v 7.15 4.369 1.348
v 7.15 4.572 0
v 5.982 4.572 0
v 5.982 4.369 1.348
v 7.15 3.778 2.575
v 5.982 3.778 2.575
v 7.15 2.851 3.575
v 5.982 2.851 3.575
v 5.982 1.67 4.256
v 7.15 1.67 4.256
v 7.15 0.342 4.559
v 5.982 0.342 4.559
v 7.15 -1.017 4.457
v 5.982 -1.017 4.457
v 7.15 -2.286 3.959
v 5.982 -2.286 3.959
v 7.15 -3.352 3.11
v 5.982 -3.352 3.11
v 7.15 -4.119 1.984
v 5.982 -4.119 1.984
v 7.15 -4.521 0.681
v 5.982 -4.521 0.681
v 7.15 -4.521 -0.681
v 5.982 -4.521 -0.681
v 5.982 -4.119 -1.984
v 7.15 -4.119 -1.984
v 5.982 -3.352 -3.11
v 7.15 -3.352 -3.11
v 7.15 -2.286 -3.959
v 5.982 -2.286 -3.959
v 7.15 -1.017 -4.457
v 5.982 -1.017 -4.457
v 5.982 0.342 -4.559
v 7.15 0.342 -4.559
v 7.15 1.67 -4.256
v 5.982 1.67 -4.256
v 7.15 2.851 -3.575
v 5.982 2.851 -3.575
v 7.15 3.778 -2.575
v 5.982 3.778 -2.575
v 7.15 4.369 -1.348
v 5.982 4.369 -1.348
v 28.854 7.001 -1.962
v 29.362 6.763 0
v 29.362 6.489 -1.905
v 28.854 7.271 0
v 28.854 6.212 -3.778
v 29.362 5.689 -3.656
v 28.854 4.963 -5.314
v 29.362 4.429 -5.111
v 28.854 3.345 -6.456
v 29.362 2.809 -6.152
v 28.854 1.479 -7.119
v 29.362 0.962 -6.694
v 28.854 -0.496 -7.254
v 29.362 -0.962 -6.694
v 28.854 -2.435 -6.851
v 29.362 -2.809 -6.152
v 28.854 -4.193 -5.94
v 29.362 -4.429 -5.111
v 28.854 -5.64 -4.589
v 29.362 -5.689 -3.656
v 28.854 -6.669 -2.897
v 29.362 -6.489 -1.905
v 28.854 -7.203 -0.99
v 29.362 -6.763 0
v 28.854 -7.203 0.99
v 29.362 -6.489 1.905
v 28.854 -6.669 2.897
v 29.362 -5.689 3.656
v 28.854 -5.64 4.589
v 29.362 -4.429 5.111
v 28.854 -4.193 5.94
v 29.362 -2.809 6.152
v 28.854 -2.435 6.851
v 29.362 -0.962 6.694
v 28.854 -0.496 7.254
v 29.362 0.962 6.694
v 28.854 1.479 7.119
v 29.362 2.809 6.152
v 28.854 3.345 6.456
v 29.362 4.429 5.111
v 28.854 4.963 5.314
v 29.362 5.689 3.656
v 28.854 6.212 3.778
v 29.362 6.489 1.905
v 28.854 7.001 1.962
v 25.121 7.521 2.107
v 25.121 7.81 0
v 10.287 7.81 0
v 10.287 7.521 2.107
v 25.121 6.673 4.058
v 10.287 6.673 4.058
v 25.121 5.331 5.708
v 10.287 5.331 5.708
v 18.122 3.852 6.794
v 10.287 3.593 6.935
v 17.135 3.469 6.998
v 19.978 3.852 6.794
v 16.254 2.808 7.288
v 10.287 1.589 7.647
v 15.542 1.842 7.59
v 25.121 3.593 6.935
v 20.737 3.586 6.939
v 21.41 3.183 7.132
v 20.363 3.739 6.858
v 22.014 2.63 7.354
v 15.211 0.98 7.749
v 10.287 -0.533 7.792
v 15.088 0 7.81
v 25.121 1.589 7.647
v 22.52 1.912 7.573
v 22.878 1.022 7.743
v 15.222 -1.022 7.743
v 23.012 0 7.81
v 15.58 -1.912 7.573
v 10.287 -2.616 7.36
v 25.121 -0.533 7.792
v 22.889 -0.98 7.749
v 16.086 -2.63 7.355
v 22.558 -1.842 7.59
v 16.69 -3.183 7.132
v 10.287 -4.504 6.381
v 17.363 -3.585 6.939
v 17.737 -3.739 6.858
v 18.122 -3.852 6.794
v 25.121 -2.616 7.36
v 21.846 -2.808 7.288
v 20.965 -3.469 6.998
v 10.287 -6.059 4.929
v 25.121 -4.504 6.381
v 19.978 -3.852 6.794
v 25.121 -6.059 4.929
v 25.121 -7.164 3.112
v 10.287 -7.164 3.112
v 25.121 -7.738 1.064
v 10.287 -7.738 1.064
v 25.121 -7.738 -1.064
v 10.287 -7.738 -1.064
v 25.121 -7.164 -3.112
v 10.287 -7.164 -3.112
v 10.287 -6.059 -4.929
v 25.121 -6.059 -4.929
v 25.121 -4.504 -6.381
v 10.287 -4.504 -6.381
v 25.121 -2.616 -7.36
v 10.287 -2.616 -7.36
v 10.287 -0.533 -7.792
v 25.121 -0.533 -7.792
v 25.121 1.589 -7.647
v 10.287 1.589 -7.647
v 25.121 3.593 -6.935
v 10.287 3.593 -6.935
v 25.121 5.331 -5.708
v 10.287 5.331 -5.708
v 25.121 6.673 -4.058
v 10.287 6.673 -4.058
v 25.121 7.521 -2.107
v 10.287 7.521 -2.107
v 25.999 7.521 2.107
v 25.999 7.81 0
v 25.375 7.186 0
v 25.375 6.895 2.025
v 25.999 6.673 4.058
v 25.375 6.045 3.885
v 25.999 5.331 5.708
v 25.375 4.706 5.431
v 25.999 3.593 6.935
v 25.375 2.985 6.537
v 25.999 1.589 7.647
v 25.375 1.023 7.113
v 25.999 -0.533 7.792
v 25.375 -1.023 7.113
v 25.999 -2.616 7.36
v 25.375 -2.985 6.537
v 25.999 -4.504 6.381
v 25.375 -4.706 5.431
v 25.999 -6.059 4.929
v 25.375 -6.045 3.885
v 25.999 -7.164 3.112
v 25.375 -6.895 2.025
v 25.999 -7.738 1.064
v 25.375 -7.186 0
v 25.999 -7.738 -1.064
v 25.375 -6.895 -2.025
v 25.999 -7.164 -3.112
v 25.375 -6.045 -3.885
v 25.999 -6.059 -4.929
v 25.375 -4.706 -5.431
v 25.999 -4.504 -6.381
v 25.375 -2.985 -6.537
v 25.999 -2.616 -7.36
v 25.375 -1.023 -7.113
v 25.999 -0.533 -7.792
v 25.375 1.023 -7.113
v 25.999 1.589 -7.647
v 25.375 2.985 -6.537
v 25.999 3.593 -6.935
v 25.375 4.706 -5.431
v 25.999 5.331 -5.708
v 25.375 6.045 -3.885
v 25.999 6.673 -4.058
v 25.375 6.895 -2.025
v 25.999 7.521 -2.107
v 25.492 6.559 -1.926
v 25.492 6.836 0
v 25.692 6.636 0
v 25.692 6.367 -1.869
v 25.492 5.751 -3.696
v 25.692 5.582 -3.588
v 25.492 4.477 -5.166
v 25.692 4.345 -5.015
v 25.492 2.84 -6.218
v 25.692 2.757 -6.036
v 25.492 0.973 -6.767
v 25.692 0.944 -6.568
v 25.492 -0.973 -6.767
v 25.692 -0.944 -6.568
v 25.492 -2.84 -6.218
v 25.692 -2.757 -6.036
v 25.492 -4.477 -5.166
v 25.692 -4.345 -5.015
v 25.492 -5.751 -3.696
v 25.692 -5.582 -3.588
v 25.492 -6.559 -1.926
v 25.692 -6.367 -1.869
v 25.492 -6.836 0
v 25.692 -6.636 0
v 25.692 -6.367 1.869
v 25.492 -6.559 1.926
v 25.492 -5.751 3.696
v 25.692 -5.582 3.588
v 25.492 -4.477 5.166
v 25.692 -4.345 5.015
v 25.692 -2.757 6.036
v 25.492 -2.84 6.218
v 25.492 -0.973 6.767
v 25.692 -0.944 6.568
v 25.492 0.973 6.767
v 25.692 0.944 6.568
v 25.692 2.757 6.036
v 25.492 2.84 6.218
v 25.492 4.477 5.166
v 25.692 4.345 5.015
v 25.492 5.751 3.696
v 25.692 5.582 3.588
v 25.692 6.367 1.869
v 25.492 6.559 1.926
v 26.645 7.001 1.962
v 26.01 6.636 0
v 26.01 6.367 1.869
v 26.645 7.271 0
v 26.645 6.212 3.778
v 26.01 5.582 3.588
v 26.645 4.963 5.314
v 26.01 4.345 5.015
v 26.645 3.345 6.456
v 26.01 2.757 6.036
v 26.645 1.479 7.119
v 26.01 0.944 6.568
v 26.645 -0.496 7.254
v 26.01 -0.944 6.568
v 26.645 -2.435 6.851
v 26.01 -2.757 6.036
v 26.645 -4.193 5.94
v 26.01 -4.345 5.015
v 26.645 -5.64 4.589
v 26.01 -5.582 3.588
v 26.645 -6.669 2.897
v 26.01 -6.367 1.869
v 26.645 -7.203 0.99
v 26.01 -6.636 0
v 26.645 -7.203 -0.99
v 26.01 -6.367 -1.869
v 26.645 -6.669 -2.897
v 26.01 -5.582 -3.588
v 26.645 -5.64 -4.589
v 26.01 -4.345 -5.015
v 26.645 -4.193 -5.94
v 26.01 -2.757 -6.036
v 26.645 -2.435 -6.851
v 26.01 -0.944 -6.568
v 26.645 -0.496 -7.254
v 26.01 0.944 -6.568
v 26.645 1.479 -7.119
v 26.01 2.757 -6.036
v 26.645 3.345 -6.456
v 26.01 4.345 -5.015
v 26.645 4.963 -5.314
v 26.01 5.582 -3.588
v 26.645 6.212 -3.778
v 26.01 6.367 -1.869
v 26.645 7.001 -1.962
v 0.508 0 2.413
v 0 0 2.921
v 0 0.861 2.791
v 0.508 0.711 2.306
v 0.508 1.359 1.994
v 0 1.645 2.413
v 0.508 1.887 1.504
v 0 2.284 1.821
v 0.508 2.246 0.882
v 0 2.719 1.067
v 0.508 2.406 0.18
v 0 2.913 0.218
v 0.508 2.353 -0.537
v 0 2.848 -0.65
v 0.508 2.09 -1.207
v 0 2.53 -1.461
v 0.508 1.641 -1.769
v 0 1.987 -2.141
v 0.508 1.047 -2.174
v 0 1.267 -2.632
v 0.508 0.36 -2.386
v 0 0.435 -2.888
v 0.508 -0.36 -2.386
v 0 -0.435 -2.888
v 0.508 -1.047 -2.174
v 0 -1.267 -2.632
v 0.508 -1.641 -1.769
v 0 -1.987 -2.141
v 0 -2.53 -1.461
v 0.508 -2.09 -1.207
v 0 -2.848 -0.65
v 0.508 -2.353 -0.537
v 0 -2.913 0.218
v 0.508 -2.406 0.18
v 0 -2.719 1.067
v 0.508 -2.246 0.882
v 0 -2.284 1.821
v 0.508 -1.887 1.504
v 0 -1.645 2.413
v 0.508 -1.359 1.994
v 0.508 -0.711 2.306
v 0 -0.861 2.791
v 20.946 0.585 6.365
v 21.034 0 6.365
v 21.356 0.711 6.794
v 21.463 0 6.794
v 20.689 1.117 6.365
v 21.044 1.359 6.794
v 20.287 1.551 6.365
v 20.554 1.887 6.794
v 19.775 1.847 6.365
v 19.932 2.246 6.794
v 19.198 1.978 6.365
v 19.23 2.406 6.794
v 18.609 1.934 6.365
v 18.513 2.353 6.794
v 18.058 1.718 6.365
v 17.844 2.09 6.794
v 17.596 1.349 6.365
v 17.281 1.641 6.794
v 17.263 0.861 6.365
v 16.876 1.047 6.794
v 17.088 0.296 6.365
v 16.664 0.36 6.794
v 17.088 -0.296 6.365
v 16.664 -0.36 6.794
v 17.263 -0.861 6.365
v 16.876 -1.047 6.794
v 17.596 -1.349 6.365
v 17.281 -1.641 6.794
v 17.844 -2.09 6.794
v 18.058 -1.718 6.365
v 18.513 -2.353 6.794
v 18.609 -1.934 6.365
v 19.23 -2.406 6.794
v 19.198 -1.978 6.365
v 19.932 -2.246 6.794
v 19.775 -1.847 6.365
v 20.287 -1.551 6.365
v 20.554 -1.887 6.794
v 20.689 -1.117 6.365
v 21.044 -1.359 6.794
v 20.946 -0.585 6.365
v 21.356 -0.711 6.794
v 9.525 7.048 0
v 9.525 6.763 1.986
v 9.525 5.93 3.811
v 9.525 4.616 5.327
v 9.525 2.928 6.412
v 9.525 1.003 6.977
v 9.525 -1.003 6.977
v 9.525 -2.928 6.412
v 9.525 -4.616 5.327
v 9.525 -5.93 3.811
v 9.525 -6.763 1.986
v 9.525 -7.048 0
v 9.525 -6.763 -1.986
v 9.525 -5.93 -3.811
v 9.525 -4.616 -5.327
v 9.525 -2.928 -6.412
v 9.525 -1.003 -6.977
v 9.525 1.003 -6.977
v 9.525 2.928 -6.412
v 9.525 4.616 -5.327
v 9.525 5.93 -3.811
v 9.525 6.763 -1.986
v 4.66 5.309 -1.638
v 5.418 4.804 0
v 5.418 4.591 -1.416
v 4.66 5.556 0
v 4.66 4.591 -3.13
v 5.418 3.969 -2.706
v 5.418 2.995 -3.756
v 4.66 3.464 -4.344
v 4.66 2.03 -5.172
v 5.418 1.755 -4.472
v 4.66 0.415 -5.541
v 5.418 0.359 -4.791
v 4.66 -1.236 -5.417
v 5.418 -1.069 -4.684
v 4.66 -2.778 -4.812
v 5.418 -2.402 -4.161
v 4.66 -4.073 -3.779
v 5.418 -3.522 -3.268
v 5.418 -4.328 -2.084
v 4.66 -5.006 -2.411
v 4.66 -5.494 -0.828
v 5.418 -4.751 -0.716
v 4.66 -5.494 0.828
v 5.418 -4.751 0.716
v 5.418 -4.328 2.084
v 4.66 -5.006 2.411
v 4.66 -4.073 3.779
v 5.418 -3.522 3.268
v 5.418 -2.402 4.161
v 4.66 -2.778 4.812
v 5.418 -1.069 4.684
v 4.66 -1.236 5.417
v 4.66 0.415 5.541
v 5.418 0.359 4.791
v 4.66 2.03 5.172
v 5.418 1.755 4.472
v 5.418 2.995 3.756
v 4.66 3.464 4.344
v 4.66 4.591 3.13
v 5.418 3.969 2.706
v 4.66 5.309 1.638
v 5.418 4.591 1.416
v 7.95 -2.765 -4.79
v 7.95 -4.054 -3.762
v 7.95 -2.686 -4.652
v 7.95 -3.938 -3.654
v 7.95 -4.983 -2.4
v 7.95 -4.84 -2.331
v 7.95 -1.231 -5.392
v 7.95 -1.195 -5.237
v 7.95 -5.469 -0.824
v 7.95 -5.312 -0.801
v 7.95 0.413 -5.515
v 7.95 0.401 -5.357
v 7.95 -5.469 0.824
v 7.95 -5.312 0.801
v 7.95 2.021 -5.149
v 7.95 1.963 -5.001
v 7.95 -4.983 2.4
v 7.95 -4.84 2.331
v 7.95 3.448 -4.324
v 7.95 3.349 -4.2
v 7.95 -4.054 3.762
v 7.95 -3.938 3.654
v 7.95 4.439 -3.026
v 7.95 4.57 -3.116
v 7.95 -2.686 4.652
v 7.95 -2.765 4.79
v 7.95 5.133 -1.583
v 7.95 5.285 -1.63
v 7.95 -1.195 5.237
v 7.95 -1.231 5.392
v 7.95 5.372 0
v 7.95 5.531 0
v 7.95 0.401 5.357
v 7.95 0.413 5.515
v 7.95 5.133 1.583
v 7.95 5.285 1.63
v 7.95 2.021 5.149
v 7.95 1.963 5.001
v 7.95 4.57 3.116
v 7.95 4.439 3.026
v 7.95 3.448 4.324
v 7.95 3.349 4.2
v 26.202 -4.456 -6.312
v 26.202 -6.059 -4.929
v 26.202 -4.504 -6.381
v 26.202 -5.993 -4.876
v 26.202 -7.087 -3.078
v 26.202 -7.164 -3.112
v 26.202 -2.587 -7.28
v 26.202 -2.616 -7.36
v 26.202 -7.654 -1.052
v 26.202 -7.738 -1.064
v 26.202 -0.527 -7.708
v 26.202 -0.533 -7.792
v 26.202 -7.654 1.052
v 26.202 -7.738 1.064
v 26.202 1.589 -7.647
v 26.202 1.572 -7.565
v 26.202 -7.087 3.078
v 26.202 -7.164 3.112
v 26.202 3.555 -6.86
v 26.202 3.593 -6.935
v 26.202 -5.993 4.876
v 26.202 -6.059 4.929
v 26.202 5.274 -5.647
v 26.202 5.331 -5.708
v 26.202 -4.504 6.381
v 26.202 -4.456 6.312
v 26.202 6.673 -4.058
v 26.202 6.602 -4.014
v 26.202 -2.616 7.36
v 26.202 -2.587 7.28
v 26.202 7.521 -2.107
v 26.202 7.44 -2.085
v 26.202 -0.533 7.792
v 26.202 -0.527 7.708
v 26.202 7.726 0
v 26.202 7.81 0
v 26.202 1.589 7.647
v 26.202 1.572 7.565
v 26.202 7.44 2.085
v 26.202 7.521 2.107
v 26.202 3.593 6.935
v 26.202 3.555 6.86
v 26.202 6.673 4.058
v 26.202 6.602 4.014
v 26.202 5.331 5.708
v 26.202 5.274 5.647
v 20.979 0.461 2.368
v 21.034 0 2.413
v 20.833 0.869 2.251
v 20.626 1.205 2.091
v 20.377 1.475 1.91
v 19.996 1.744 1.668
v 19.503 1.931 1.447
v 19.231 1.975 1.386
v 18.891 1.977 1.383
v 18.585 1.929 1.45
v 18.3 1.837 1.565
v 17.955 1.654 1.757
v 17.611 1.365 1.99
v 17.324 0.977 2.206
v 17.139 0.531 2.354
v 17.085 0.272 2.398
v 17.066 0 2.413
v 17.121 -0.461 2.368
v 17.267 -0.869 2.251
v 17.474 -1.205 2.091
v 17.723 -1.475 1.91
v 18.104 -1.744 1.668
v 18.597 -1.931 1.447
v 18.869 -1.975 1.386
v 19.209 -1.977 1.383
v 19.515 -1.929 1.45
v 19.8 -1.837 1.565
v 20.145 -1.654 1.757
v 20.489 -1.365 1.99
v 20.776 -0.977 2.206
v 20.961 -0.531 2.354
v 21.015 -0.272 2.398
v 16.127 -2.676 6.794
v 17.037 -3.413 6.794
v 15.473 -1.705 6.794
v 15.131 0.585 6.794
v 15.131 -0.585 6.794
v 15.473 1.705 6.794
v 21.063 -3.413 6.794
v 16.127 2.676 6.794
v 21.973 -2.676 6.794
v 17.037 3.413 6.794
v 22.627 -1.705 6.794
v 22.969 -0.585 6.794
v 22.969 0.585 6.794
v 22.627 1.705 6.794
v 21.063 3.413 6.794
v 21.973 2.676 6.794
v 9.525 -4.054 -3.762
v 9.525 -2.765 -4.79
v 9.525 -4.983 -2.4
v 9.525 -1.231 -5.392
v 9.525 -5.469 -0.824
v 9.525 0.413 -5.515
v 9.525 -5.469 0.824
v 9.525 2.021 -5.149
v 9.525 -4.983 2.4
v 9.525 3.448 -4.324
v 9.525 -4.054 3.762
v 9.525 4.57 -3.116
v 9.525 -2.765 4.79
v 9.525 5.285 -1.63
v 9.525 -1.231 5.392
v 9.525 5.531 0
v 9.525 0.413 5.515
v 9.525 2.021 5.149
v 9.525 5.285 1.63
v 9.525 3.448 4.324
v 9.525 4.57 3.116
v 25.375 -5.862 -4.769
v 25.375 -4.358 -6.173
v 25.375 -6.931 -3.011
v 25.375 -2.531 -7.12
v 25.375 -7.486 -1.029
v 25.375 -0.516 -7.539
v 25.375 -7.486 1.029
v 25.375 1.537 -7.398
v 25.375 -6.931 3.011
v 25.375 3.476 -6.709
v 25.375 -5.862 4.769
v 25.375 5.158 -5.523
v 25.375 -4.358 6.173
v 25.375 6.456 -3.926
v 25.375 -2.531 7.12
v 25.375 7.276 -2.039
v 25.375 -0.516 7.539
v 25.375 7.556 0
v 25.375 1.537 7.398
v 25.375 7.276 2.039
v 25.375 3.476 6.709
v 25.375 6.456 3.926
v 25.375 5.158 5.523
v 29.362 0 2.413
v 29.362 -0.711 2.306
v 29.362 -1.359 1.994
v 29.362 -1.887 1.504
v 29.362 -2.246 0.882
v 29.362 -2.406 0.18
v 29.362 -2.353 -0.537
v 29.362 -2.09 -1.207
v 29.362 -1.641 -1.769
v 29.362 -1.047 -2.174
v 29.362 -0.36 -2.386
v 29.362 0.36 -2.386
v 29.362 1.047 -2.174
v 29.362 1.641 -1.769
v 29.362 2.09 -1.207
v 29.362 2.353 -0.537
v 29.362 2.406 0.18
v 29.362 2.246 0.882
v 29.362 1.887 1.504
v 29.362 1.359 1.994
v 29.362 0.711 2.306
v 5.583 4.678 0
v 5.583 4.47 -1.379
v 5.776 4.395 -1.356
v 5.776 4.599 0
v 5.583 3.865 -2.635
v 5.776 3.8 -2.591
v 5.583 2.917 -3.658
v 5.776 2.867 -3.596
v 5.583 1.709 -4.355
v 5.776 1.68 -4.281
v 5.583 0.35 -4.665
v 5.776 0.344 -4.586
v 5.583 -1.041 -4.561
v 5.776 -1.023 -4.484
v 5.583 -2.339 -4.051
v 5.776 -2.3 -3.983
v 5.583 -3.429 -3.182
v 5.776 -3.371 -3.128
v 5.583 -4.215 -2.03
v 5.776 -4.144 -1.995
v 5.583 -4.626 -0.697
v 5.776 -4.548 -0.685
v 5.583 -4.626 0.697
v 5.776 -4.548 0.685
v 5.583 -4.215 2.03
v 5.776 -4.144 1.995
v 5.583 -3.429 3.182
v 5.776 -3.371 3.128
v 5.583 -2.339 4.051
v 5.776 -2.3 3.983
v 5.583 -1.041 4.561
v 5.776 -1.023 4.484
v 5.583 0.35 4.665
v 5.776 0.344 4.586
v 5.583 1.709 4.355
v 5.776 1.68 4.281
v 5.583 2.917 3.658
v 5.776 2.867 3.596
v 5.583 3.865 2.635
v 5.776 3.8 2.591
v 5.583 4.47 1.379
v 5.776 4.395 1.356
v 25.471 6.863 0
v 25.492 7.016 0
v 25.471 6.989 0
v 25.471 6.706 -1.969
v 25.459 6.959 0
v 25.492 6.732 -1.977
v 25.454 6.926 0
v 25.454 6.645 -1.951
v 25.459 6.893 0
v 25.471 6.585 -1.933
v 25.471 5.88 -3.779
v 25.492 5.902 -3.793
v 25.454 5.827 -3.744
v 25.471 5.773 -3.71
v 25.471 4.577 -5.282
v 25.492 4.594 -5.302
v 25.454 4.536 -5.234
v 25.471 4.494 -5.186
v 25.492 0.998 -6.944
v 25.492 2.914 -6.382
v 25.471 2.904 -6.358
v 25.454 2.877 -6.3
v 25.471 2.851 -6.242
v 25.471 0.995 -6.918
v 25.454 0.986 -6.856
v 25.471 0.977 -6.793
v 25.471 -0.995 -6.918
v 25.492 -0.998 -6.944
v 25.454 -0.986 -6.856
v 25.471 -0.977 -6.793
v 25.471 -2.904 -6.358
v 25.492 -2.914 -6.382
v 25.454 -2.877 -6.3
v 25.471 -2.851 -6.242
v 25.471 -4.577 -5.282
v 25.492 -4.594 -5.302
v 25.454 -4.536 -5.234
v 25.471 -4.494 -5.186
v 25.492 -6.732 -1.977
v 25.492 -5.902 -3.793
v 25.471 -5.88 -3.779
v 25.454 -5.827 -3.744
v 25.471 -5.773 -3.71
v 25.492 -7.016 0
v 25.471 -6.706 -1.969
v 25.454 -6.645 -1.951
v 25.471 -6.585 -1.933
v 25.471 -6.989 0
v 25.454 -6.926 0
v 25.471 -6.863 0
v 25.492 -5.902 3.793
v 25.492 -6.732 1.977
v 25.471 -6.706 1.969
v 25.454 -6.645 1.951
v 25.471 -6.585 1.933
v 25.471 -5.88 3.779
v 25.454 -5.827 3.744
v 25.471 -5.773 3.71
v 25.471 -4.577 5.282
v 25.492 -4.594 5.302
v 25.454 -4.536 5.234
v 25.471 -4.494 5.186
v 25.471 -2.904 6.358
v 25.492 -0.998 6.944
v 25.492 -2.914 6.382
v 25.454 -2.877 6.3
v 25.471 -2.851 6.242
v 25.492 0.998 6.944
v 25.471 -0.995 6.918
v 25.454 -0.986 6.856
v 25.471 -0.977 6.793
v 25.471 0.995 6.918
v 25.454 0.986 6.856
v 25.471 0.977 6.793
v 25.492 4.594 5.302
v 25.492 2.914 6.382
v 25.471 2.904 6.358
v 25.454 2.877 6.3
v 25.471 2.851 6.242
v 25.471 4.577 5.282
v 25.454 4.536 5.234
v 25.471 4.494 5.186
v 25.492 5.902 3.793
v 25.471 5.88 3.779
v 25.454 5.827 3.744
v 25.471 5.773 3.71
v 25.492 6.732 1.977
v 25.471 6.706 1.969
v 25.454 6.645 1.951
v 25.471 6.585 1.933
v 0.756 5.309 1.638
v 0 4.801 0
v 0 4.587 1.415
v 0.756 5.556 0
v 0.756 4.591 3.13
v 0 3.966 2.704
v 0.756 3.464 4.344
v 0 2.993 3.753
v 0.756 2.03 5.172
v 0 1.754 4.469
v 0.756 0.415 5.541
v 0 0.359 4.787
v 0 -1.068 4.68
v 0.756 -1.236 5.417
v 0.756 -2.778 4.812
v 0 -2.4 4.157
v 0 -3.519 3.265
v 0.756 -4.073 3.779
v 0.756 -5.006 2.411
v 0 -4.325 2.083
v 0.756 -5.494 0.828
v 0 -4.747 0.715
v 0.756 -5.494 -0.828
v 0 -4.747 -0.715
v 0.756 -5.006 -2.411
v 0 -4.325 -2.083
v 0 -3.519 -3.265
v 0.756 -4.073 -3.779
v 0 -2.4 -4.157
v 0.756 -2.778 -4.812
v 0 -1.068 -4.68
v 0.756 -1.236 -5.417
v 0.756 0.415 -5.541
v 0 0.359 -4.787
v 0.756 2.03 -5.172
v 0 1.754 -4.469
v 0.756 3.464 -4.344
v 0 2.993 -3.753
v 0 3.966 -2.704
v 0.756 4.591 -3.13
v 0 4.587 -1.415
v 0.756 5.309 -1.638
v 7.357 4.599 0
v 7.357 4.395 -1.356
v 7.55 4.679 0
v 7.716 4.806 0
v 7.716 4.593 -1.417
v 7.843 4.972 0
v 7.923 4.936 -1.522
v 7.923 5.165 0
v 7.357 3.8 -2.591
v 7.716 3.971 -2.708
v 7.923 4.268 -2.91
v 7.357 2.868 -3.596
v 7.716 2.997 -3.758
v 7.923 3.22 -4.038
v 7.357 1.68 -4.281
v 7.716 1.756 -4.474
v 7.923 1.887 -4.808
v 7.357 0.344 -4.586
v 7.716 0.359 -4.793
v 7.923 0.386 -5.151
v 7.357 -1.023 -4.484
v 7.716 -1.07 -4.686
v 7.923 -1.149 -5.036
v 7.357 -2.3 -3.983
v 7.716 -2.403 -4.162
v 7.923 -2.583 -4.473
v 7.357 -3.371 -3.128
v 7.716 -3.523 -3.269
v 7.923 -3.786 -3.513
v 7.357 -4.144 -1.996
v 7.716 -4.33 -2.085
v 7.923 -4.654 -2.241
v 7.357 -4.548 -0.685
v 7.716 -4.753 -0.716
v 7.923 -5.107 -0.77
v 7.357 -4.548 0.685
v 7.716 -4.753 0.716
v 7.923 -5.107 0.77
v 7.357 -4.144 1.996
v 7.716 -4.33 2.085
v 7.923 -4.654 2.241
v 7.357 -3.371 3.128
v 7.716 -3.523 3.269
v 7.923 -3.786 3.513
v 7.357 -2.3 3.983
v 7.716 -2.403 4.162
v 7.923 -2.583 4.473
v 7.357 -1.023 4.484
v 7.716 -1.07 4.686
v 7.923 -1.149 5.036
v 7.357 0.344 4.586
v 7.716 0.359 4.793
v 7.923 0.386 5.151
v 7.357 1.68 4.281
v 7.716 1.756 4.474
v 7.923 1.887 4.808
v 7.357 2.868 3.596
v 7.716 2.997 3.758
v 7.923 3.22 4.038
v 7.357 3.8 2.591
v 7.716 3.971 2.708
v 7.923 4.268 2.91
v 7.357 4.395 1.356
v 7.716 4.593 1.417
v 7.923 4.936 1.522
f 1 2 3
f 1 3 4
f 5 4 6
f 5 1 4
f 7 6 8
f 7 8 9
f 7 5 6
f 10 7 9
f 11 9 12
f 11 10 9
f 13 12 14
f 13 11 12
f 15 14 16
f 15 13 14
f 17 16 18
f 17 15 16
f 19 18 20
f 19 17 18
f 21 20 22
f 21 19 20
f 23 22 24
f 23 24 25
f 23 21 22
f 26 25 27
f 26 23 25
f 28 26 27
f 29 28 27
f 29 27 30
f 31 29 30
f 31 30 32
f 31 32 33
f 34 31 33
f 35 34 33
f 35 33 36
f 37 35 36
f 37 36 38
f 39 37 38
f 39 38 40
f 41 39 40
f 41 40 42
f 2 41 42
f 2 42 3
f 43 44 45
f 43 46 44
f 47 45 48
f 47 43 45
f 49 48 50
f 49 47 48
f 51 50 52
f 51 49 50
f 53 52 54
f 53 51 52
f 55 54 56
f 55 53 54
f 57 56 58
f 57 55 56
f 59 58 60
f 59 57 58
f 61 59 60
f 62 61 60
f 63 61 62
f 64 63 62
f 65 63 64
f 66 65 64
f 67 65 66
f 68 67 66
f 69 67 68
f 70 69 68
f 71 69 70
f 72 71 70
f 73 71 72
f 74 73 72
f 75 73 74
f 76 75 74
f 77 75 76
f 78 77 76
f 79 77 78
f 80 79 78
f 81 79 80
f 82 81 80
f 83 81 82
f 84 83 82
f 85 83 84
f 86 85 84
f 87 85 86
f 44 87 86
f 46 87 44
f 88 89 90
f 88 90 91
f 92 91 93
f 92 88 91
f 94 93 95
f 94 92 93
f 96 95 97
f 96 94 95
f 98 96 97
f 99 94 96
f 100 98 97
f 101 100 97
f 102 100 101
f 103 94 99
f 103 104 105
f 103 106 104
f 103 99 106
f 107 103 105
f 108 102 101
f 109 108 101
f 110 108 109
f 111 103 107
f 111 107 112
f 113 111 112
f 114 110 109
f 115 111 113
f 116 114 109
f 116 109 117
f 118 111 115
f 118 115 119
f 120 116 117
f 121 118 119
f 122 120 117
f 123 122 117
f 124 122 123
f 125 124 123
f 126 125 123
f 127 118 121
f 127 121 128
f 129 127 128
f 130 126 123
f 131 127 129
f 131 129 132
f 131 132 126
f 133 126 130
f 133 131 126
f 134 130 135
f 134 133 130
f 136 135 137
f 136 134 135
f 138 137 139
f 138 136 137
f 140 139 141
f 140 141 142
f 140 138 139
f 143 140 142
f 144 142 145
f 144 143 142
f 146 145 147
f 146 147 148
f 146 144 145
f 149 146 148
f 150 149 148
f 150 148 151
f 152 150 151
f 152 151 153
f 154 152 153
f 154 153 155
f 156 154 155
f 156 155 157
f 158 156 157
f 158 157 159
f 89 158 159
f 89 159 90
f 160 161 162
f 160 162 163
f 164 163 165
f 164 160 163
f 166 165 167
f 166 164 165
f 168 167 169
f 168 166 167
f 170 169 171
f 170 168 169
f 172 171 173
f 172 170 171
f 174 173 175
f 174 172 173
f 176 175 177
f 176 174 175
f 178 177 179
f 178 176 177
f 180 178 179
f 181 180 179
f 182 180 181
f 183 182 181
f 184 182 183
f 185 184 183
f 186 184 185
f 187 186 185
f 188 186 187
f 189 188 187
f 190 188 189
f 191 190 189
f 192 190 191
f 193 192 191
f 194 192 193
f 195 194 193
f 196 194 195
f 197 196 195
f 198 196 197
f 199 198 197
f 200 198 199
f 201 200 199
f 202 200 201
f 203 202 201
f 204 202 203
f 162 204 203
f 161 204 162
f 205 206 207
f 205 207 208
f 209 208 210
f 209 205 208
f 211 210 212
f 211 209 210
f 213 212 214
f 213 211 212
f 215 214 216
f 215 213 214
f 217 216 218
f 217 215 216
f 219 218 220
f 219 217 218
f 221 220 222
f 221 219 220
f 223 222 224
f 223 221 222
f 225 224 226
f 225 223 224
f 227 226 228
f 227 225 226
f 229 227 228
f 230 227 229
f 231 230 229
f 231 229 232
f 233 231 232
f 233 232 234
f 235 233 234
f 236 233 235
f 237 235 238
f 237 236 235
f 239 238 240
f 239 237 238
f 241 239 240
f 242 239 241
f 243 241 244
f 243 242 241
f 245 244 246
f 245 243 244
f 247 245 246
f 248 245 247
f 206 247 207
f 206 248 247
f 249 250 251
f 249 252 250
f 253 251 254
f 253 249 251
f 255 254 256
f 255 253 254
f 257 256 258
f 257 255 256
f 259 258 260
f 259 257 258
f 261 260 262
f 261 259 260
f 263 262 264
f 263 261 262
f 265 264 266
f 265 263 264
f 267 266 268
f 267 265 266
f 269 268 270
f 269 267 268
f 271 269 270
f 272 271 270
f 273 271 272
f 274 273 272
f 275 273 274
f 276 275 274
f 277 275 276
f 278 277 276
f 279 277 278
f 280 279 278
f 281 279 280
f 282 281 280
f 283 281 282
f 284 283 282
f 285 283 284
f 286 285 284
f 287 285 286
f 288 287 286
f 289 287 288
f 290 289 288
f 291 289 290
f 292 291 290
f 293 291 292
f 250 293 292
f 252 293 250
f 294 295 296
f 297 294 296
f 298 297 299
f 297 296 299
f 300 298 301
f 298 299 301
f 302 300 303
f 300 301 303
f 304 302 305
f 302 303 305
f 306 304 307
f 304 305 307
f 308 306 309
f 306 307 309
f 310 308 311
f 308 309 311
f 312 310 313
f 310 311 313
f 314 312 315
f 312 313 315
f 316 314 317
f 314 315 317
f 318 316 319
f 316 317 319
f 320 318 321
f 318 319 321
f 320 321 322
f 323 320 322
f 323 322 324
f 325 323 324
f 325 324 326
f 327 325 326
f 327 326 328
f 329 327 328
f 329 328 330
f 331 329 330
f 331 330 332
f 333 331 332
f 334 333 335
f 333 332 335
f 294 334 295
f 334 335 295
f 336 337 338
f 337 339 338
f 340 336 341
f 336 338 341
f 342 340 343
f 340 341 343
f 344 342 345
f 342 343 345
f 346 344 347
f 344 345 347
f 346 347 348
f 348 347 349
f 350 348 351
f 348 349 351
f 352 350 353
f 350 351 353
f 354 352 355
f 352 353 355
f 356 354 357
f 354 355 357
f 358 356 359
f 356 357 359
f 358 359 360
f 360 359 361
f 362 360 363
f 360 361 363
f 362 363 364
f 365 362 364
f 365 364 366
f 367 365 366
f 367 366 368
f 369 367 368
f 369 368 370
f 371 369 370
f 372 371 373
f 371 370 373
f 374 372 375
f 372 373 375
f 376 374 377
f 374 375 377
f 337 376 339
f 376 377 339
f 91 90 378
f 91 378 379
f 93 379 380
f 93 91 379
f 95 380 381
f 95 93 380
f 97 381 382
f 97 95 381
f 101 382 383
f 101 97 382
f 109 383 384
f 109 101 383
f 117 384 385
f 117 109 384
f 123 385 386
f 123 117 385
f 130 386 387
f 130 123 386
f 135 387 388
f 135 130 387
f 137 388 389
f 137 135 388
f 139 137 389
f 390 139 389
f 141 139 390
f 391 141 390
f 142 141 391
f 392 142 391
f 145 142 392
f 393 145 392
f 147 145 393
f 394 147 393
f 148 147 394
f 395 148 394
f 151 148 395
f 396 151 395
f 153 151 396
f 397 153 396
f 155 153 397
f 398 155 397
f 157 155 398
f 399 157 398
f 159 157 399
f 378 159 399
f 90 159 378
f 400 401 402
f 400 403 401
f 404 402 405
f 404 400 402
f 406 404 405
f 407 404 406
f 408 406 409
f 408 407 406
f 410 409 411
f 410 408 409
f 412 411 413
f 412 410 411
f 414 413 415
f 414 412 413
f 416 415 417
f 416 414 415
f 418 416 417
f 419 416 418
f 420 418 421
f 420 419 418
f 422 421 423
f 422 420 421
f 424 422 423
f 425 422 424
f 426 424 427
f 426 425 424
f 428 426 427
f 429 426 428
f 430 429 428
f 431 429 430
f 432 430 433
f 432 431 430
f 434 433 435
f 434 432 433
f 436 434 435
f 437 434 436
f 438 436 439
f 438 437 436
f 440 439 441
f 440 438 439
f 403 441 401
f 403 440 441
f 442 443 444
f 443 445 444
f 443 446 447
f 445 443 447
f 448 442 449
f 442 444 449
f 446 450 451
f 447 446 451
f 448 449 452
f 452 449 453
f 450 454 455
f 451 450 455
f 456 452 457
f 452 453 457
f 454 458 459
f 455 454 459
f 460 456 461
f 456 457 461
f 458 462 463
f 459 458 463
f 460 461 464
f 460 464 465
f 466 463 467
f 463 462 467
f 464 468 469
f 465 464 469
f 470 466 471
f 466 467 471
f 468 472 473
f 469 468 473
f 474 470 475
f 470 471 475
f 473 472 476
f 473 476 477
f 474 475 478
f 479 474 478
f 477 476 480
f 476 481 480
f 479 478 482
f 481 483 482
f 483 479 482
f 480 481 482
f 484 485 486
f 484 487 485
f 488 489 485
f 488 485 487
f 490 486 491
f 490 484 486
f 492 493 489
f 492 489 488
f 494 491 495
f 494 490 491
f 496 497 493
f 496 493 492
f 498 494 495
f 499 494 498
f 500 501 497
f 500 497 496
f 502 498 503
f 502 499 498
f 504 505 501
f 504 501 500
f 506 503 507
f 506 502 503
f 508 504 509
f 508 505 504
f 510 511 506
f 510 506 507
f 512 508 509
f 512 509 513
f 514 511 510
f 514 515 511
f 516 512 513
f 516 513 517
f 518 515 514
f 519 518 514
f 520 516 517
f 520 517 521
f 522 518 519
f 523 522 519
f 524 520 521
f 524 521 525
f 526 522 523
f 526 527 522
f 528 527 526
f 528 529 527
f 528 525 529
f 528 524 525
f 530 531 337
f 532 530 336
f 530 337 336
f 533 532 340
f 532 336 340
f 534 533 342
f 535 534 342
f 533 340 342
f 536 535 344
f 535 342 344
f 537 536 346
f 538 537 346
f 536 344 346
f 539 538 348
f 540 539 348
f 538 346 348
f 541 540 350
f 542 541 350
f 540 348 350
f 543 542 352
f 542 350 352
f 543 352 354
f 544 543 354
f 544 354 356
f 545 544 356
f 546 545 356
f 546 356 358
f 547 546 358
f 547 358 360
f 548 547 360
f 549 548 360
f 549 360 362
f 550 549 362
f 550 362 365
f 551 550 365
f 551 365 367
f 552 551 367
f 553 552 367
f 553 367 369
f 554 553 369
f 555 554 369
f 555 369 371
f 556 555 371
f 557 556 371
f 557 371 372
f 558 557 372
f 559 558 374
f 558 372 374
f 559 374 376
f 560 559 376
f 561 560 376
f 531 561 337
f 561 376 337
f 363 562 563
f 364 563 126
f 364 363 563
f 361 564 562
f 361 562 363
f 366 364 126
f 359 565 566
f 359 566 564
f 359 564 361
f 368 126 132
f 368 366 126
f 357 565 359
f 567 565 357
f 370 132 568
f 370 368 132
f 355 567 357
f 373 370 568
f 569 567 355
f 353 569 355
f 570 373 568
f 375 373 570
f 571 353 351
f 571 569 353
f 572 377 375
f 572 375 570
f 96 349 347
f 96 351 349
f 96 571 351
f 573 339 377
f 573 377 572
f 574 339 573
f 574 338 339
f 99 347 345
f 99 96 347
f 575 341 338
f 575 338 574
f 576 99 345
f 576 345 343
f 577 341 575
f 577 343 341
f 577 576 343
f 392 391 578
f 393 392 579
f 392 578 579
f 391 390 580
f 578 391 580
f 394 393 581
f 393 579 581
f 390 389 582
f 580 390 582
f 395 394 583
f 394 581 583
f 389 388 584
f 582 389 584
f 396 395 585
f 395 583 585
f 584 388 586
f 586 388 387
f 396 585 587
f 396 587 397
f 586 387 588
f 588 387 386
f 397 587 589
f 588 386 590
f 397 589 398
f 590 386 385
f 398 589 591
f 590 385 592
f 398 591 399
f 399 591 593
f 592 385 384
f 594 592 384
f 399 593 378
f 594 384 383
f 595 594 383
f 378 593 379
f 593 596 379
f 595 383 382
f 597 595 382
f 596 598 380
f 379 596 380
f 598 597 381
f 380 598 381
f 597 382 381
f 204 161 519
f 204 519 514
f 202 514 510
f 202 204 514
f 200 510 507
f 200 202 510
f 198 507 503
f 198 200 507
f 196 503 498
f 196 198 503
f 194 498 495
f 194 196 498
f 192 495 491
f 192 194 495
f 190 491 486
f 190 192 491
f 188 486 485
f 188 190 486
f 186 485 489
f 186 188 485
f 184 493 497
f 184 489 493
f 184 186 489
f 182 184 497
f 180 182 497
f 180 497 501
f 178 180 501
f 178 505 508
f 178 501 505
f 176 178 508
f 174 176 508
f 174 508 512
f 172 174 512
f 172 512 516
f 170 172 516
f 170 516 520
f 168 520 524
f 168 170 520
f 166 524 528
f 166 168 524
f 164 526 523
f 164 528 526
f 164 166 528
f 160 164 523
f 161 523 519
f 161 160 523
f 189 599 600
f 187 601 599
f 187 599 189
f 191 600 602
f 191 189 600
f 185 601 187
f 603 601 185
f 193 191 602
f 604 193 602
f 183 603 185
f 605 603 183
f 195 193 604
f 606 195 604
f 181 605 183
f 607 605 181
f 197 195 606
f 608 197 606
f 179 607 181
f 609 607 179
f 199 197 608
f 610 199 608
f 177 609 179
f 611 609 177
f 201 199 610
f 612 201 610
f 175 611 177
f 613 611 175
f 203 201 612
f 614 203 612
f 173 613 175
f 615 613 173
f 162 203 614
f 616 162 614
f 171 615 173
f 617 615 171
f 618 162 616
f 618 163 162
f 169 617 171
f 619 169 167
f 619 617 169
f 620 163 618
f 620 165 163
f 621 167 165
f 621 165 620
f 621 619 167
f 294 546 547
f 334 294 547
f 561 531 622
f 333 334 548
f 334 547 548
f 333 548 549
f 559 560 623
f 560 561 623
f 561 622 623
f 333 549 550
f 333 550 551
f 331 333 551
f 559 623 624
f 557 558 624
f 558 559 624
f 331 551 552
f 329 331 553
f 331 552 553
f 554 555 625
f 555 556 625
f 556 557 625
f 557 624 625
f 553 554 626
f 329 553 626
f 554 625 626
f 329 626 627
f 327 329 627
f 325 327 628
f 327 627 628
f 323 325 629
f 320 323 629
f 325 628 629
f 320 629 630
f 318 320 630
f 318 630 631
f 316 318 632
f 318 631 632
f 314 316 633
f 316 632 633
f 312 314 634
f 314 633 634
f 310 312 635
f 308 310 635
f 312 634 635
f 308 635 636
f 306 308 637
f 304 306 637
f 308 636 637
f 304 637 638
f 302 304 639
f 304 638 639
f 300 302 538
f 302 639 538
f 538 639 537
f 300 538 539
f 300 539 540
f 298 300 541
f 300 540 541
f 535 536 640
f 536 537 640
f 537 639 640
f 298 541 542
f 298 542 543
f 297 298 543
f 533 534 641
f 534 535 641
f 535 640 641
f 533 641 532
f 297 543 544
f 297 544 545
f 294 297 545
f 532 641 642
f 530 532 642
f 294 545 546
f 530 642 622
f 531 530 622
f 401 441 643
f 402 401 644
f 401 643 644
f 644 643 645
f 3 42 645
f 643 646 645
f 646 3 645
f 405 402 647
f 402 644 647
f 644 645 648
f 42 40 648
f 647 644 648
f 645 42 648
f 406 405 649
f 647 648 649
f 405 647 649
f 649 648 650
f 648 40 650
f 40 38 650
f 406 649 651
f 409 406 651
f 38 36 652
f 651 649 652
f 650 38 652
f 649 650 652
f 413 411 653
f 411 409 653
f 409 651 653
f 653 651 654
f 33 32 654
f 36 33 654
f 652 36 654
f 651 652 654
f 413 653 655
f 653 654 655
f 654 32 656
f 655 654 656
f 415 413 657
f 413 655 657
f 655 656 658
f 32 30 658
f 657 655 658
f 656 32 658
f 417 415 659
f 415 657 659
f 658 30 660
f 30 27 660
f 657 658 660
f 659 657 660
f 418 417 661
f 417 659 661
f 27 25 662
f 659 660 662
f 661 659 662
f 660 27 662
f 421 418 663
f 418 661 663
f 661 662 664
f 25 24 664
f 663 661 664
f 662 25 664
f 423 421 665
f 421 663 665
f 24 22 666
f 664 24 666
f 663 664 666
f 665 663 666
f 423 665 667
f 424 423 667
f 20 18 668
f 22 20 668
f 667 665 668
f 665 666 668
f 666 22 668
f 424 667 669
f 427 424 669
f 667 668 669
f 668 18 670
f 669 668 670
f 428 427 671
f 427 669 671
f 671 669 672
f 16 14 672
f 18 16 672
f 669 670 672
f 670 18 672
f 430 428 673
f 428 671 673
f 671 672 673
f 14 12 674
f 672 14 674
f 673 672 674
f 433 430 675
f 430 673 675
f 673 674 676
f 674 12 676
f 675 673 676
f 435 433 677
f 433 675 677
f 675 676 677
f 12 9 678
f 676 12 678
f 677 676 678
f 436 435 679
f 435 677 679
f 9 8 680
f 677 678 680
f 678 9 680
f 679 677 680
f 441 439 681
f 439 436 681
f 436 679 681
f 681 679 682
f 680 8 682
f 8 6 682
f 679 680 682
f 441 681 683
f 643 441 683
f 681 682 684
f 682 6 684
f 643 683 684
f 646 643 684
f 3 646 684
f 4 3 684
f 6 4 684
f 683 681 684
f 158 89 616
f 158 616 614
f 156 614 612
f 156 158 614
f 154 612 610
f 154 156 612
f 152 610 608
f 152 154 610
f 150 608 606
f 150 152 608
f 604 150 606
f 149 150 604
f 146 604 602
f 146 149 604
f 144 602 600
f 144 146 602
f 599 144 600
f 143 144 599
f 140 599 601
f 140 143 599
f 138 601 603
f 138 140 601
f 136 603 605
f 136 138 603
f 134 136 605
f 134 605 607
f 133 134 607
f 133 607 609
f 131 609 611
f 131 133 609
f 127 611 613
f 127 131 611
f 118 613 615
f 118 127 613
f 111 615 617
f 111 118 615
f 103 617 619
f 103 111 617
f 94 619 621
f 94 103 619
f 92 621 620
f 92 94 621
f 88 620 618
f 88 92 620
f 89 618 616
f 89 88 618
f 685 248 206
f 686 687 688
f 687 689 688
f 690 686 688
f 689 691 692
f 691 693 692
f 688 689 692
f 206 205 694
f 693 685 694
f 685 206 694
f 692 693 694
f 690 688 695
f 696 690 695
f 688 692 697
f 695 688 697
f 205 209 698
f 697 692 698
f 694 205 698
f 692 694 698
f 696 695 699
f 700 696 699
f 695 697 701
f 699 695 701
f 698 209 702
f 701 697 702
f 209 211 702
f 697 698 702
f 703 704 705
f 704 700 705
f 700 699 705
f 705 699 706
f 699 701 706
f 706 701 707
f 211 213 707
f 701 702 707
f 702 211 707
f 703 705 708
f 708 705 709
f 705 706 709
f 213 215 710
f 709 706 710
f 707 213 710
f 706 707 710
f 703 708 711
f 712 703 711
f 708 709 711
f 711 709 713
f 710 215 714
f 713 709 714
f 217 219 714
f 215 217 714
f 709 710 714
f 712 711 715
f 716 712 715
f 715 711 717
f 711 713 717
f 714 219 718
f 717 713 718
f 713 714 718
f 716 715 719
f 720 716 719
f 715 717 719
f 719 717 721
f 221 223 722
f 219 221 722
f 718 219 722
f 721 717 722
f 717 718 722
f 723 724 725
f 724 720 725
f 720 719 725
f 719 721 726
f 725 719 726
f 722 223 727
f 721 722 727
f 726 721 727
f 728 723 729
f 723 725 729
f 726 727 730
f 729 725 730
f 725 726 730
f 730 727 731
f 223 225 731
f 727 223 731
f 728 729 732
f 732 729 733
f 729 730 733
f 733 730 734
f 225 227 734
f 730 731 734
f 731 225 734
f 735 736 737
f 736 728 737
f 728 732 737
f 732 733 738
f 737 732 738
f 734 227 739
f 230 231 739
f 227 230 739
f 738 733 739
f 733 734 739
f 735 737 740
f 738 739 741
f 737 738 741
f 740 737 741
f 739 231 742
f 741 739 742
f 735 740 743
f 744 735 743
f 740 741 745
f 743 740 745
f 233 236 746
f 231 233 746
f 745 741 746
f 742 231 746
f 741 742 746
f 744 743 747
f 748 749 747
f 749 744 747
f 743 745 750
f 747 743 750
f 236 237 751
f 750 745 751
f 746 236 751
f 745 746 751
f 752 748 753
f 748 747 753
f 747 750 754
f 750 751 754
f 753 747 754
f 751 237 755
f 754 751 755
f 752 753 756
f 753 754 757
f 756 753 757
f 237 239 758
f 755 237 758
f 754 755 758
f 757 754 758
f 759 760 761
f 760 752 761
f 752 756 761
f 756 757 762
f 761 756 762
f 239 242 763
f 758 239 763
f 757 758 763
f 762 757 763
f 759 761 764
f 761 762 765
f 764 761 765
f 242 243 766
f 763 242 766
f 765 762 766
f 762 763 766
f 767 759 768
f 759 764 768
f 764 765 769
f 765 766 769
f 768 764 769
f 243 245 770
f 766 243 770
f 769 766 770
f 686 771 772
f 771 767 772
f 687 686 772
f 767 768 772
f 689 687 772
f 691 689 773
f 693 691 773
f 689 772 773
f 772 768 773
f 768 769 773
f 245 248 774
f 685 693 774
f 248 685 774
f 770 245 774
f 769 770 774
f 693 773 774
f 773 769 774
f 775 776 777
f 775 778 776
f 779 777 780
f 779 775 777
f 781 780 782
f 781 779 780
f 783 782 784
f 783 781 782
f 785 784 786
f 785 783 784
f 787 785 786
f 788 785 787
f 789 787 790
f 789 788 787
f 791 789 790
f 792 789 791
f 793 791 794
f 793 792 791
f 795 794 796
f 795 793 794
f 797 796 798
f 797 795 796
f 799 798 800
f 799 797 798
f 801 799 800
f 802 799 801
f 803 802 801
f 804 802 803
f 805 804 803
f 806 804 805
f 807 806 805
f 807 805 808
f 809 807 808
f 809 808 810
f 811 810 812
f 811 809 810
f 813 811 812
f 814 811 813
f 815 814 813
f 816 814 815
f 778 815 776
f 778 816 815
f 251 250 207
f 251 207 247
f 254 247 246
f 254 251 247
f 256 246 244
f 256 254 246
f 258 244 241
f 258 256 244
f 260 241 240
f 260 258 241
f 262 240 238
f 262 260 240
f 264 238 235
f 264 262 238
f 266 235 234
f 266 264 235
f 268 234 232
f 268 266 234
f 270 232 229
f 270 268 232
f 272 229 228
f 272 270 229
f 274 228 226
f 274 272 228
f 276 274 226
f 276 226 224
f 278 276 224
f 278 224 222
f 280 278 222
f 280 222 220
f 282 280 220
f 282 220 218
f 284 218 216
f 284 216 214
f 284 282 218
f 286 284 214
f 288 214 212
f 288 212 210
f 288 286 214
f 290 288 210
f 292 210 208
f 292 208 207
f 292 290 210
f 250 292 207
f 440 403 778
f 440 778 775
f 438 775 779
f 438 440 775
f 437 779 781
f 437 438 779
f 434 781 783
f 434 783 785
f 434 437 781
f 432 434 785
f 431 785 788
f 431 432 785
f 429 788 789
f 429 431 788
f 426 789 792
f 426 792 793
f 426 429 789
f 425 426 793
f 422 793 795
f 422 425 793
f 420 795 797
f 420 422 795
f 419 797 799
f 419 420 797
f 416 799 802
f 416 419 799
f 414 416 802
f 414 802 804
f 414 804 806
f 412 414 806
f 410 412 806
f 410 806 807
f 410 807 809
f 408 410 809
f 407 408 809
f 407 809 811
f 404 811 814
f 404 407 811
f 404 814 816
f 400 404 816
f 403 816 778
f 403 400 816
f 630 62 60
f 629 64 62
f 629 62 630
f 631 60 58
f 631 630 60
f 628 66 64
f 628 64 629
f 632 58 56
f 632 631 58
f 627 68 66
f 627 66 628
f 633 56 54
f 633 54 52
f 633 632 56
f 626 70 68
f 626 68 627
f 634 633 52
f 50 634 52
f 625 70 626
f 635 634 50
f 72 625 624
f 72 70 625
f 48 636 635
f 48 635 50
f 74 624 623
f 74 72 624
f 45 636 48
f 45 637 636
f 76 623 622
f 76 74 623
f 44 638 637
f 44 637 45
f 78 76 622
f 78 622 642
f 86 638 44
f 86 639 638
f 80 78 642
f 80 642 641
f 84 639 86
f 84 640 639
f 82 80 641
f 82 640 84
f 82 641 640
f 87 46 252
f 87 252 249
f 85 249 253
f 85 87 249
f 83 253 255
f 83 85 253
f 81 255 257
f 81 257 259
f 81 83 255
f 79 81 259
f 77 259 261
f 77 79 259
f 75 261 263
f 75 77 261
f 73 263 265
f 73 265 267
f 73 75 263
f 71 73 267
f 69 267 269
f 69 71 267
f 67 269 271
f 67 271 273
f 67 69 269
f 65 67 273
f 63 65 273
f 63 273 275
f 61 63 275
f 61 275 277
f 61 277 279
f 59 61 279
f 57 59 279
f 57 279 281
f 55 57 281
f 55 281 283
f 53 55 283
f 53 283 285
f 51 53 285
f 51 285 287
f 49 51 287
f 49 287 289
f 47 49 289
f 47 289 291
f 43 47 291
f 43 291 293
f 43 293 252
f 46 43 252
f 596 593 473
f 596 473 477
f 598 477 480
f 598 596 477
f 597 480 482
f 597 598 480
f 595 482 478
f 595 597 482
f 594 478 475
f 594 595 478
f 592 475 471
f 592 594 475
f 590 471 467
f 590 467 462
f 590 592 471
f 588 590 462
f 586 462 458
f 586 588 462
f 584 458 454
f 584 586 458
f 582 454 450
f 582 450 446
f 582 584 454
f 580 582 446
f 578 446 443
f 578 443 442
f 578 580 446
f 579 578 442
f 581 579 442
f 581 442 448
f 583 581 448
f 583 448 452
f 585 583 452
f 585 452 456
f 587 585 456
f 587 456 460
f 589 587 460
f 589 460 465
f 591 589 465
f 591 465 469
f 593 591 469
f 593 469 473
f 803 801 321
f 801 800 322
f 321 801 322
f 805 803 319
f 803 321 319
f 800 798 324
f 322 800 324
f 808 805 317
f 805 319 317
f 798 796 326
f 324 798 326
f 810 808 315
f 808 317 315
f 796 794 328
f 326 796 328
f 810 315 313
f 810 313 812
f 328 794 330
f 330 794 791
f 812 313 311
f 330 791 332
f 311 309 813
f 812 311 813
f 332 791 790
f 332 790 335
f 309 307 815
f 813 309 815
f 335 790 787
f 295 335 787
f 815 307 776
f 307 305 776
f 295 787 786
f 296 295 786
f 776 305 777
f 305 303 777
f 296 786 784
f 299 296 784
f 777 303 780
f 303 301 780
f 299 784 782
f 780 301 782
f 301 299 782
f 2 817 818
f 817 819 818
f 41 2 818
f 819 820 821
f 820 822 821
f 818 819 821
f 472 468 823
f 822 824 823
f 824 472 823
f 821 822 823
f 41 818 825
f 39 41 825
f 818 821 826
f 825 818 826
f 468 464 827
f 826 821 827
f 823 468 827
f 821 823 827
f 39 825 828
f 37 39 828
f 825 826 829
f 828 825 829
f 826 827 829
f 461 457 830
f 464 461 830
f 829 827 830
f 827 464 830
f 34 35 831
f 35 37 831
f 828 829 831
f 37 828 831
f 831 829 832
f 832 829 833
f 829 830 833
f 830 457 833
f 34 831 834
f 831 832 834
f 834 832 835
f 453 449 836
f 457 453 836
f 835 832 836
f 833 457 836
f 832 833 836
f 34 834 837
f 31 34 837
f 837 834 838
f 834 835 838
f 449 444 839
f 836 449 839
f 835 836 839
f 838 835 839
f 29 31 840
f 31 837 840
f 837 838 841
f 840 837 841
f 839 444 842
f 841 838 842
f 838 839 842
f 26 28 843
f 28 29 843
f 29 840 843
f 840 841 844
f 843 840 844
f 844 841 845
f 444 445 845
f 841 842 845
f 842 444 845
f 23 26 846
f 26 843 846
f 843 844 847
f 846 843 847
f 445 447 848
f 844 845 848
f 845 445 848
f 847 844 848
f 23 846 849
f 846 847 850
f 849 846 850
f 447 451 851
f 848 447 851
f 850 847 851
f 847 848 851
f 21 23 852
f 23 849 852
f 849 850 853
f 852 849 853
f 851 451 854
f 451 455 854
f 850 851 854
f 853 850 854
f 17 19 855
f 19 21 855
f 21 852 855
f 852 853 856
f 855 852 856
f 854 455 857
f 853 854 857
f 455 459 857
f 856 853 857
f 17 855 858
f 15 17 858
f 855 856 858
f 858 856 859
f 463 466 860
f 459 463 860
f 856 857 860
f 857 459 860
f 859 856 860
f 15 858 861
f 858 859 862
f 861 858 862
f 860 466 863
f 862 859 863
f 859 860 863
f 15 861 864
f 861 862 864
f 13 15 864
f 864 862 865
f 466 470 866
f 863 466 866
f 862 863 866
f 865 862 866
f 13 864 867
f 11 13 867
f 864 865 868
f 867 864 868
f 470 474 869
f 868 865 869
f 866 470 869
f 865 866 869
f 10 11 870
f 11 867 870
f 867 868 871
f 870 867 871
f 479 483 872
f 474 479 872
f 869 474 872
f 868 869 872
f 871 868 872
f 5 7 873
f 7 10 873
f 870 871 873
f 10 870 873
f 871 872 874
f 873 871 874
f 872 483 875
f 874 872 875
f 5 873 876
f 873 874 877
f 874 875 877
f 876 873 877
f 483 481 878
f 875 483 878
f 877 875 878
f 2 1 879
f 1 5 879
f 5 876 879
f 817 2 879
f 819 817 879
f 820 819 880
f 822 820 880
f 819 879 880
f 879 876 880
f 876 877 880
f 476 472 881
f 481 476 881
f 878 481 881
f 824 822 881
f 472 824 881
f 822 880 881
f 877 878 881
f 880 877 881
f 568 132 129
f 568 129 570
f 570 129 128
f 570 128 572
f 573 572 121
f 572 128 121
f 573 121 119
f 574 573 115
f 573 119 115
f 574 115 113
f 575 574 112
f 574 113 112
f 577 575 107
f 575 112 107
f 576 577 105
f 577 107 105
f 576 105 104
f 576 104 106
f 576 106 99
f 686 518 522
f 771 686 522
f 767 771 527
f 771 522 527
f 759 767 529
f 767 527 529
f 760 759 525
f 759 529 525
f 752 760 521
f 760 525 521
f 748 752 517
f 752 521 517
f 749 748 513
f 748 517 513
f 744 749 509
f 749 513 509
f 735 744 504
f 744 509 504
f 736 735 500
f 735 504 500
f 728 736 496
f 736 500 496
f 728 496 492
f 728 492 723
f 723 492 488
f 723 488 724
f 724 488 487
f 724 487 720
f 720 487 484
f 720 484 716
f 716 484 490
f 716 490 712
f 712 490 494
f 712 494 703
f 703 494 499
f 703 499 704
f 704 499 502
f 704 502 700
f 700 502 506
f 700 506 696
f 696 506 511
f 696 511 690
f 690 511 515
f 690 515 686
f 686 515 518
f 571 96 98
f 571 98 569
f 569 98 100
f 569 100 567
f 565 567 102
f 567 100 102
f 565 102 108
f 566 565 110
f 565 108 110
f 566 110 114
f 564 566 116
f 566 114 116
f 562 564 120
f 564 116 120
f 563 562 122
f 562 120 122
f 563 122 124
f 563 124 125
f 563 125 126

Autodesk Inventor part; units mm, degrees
sketch "Sketch_2" plane through (0, 0, 0) normal (0, 0, 1) x (1, 0, 0)
  line L0 (9.525, 0) -> (0, 0)
  line L1 (0, 0) -> (0, 4.8006)
  line L2 (0, 4.8006) -> (0.7556, 5.5563)
  line L3 (0.7556, 5.5563) -> (4.6603, 5.5563)
  line L4 (4.6603, 5.5563) -> (5.4181, 4.8042)
  arc A0 (5.4181, 4.8042) -> (5.9817, 4.572) centre (5.9817, 5.3721) ccw
  line L5 (5.9817, 4.572) -> (7.1501, 4.572)
  arc A1 (7.1501, 4.572) -> (7.9502, 5.3721) centre (7.1501, 5.3721) ccw
  line L6 (7.9502, 5.3721) -> (7.9502, 5.5309)
  line L7 (7.9502, 5.5309) -> (9.525, 5.5309)
  line L8 (9.525, 5.5309) -> (9.525, 0)
  line L9 (9.525, 0) -> (0, 0)
revolve "Revolution1" add sketch "Sketch_2" angle 360 about axis through (9.525, 0, 0) along (1, 0, 0)
thread "Thread1" size "7/16-20 UNF" class "2A" standard "ANSI Unified Screw Threads" full length
sketch "Sketch_3" plane through (0, 0, 0) normal (0, 0, 1) x (1, 0, 0)
  line L0 (29.3624, 0) -> (9.525, 0)
  line L1 (9.525, 0) -> (9.525, 7.0485)
  line L2 (9.525, 7.0485) -> (10.287, 7.8105)
  line L3 (10.287, 7.8105) -> (25.1206, 7.8105)
  line L4 (25.1206, 7.8105) -> (25.3746, 7.5565)
  line L5 (25.3746, 7.5565) -> (25.3746, 6.6357)
  line L6 (25.3746, 6.6357) -> (26.0096, 6.6357)
  line L7 (26.0096, 6.6357) -> (26.6446, 7.2708)
  line L8 (26.6446, 7.2708) -> (28.8544, 7.2708)
  line L9 (28.8544, 7.2708) -> (29.3624, 6.7627)
  line L10 (29.3624, 6.7627) -> (29.3624, 0)
  line L11 (29.3624, 0) -> (9.525, 0)
revolve "Revolution2" add sketch "Sketch_3" angle 360 about axis through (29.3624, 0, 0) along (1, 0, 0)
sketch "Sketch3" plane through (0, 0, 0) normal (-1, 0, 0) x (0, 0, 1)
  point P0 (0, 0)
hole "Hole1" at (0, 0, 0) direction (1, 0, 0) diameter 4.826 depth 29.3624 countersink diameter 5.842 countersink angle 90
sketch "Sketch_12" plane through (0, 0, 0) normal (0, 1, 0) x (-1, 0, 0)
  line L0 (-19.05, 7.8105) -> (-19.05, -1.016)
  line L1 (-19.05, -1.016) -> (-21.0337, -1.016)
  line L2 (-21.0337, -1.016) -> (-21.0337, 6.3652)
  line L3 (-21.0337, 6.3652) -> (-21.463, 6.7945)
  line L4 (-21.463, 6.7945) -> (-23.0124, 6.7945)
  line L5 (-23.0124, 6.7945) -> (-23.0124, 7.8105)
  line L6 (-23.0124, 7.8105) -> (-19.05, 7.8105)
  line L7 (-19.05, 7.8105) -> (-19.05, -1.016)
revolve "Revolution3" cut sketch "Sketch_12" angle 360 about axis through (19.05, 0, 7.8105) along (0, 0, 1)
thread "Thread2" size "10-32 UNF" class "2B" standard "ANSI Unified Screw Threads" length 1.9964
sketch "Sketch_47" plane through (0, 0, 0) normal (0, 0, 1) x (1, 0, 0)
  line L0 (26.0096, 0) -> (25.3746, 0)
  line L1 (25.3746, 7.1861) -> (25.3746, 6.3817)
  line L2 (25.3746, 6.3817) -> (26.0096, 6.3817)
  line L3 (26.0096, 6.3817) -> (26.0096, 6.6357)
  line L4 (26.0096, 6.6357) -> (25.6921, 6.6357)
  line L5 (25.6921, 6.6357) -> (25.4916, 6.8362)
  arc A0 (25.4916, 7.0158) -> (25.4916, 6.8362) centre (25.5814, 6.926) ccw
  line L6 (25.4916, 7.0158) -> (26.2022, 7.7263)
  line L7 (26.2022, 7.7263) -> (26.2022, 7.8105)
  line L8 (26.2022, 7.8105) -> (25.999, 7.8105)
  line L9 (25.999, 7.8105) -> (25.3746, 7.1861)
revolve "Revolution4" add sketch "Sketch_47" angle 360 about axis through (26.0096, 0, 0) along (1, 0, 0)
ref_plane "dp1_XY" through (9.525, 5.5309, 0) normal (0, 0, 1) x (1, 0, 0)
ref_plane "dp1_YZ" through (9.525, 5.5309, 0) normal (1, 0, 0) x (0, 1, 0)
ref_plane "dp1_ZX" through (9.525, 5.5309, 0) normal (0, 1, 0) x (0, 0, 1)
ref_plane "dp2_XY" through (9.525, -5.5309, 0) normal (0, 0, 1) x (1, 0, 0)
ref_plane "dp2_YZ" through (9.525, -5.5309, 0) normal (1, 0, 0) x (0, 1, 0)
ref_plane "dp2_ZX" through (9.525, -5.5309, 0) normal (0, 1, 0) x (0, 0, 1)
ref_plane "hh_XY" through (0, 5.5563, 0) normal (0, 0, 1) x (1, 0, 0)
ref_plane "hh_YZ" through (0, 5.5563, 0) normal (1, 0, 0) x (0, 1, 0)
ref_plane "hh_ZX" through (0, 5.5563, 0) normal (0, 1, 0) x (0, 0, 1)
ref_plane "port_XY" through (19.05, 0, 0) normal (0, 0, 1) x (1, 0, 0)
ref_plane "port_YZ" through (19.05, 0, 0) normal (1, 0, 0) x (0, 1, 0)
ref_plane "port_ZX" through (19.05, 0, 0) normal (0, 1, 0) x (0, 0, 1)
ref_plane "rod_guide_XY" through (0, 0, 0) normal (1, 0, 0) x (0, 0, -1)
ref_plane "rod_guide_YZ" through (0, 0, 0) normal (0, 0, -1) x (0, 1, 0)
ref_plane "rod_guide_ZX" through (0, 0, 0) normal (0, 1, 0) x (1, 0, 0)
ref_plane "s1_XY" through (7.9502, 0, 0) normal (0, 0, 1) x (1, 0, 0)
ref_plane "s1_YZ" through (7.9502, 0, 0) normal (1, 0, 0) x (0, 1, 0)
ref_plane "s1_ZX" through (7.9502, 0, 0) normal (0, 1, 0) x (0, 0, 1)
ref_plane "s2_XY" through (9.525, 0, 0) normal (0, 0, 1) x (1, 0, 0)
ref_plane "s2_YZ" through (9.525, 0, 0) normal (1, 0, 0) x (0, 1, 0)
ref_plane "s2_ZX" through (9.525, 0, 0) normal (0, 1, 0) x (0, 0, 1)
ref_plane "t1_XY" through (9.525, 0, 0) normal (1, 0, 0) x (0, 0, -1)
ref_plane "t1_YZ" through (9.525, 0, 0) normal (0, 0, -1) x (0, 1, 0)
ref_plane "t1_ZX" through (9.525, 0, 0) normal (0, 1, 0) x (1, 0, 0)
ref_plane "t111_XY" through (9.525, 0, 0) normal (1, 0, 0) x (0, 0, -1)
ref_plane "t111_YZ" through (9.525, 0, 0) normal (0, 0, -1) x (0, 1, 0)
ref_plane "t111_ZX" through (9.525, 0, 0) normal (0, 1, 0) x (1, 0, 0)
ref_plane "to_foot_bracket_XY" through (9.525, 0, 0) normal (1, 0, 0) x (0, 0, -1)
ref_plane "to_foot_bracket_YZ" through (9.525, 0, 0) normal (0, 0, -1) x (0, 1, 0)
ref_plane "to_foot_bracket_ZX" through (9.525, 0, 0) normal (0, 1, 0) x (1, 0, 0)
ref_plane "to_nut_XY" through (7.9502, 0, 0) normal (1, 0, 0) x (0, 0, -1)
ref_plane "to_nut_YZ" through (7.9502, 0, 0) normal (0, 0, -1) x (0, 1, 0)
ref_plane "to_nut_ZX" through (7.9502, 0, 0) normal (0, 1, 0) x (1, 0, 0)
ref_plane "to_rod_XY" through (0, 0, 0) normal (1, 0, 0) x (0, 0, -1)
ref_plane "to_rod_YZ" through (0, 0, 0) normal (0, 0, -1) x (0, 1, 0)
ref_plane "to_rod_ZX" through (0, 0, 0) normal (0, 1, 0) x (1, 0, 0)
ref_plane "to_screw_XY" through (19.05, 0, 0) normal (0, 1, 0) x (1, 0, 0)
ref_plane "to_screw_YZ" through (19.05, 0, 0) normal (1, 0, 0) x (0, 0, -1)
ref_plane "to_screw_ZX" through (19.05, 0, 0) normal (0, 0, -1) x (0, 1, 0)
ref_plane "to_trunnion_brackets_XY" through (0, 0, 0) normal (0, 1, 0) x (1, 0, 0)
ref_plane "to_trunnion_brackets_YZ" through (0, 0, 0) normal (1, 0, 0) x (0, 0, -1)
ref_plane "to_trunnion_brackets_ZX" through (0, 0, 0) normal (0, 0, -1) x (0, 1, 0)
ref_plane "to_trunnion_brackets1_XY" through (0, 0, 0) normal (0, 1, 0) x (1, 0, 0)
ref_plane "to_trunnion_brackets1_YZ" through (0, 0, 0) normal (1, 0, 0) x (0, 0, -1)
ref_plane "to_trunnion_brackets1_ZX" through (0, 0, 0) normal (0, 0, -1) x (0, 1, 0)
ref_plane "to_trunnion_brackets2_XY" through (0, 0, 0) normal (0, 1, 0) x (1, 0, 0)
ref_plane "to_trunnion_brackets2_YZ" through (0, 0, 0) normal (1, 0, 0) x (0, 0, -1)
ref_plane "to_trunnion_brackets2_ZX" through (0, 0, 0) normal (0, 0, -1) x (0, 1, 0)
ref_plane "to_tube_XY" through (26.0096, 0, 0) normal (1, 0, 0) x (0, 0, -1)
ref_plane "to_tube_YZ" through (26.0096, 0, 0) normal (0, 0, -1) x (0, 1, 0)
ref_plane "to_tube_ZX" through (26.0096, 0, 0) normal (0, 1, 0) x (1, 0, 0)
properties part number "02R000-0_rod_guide"
